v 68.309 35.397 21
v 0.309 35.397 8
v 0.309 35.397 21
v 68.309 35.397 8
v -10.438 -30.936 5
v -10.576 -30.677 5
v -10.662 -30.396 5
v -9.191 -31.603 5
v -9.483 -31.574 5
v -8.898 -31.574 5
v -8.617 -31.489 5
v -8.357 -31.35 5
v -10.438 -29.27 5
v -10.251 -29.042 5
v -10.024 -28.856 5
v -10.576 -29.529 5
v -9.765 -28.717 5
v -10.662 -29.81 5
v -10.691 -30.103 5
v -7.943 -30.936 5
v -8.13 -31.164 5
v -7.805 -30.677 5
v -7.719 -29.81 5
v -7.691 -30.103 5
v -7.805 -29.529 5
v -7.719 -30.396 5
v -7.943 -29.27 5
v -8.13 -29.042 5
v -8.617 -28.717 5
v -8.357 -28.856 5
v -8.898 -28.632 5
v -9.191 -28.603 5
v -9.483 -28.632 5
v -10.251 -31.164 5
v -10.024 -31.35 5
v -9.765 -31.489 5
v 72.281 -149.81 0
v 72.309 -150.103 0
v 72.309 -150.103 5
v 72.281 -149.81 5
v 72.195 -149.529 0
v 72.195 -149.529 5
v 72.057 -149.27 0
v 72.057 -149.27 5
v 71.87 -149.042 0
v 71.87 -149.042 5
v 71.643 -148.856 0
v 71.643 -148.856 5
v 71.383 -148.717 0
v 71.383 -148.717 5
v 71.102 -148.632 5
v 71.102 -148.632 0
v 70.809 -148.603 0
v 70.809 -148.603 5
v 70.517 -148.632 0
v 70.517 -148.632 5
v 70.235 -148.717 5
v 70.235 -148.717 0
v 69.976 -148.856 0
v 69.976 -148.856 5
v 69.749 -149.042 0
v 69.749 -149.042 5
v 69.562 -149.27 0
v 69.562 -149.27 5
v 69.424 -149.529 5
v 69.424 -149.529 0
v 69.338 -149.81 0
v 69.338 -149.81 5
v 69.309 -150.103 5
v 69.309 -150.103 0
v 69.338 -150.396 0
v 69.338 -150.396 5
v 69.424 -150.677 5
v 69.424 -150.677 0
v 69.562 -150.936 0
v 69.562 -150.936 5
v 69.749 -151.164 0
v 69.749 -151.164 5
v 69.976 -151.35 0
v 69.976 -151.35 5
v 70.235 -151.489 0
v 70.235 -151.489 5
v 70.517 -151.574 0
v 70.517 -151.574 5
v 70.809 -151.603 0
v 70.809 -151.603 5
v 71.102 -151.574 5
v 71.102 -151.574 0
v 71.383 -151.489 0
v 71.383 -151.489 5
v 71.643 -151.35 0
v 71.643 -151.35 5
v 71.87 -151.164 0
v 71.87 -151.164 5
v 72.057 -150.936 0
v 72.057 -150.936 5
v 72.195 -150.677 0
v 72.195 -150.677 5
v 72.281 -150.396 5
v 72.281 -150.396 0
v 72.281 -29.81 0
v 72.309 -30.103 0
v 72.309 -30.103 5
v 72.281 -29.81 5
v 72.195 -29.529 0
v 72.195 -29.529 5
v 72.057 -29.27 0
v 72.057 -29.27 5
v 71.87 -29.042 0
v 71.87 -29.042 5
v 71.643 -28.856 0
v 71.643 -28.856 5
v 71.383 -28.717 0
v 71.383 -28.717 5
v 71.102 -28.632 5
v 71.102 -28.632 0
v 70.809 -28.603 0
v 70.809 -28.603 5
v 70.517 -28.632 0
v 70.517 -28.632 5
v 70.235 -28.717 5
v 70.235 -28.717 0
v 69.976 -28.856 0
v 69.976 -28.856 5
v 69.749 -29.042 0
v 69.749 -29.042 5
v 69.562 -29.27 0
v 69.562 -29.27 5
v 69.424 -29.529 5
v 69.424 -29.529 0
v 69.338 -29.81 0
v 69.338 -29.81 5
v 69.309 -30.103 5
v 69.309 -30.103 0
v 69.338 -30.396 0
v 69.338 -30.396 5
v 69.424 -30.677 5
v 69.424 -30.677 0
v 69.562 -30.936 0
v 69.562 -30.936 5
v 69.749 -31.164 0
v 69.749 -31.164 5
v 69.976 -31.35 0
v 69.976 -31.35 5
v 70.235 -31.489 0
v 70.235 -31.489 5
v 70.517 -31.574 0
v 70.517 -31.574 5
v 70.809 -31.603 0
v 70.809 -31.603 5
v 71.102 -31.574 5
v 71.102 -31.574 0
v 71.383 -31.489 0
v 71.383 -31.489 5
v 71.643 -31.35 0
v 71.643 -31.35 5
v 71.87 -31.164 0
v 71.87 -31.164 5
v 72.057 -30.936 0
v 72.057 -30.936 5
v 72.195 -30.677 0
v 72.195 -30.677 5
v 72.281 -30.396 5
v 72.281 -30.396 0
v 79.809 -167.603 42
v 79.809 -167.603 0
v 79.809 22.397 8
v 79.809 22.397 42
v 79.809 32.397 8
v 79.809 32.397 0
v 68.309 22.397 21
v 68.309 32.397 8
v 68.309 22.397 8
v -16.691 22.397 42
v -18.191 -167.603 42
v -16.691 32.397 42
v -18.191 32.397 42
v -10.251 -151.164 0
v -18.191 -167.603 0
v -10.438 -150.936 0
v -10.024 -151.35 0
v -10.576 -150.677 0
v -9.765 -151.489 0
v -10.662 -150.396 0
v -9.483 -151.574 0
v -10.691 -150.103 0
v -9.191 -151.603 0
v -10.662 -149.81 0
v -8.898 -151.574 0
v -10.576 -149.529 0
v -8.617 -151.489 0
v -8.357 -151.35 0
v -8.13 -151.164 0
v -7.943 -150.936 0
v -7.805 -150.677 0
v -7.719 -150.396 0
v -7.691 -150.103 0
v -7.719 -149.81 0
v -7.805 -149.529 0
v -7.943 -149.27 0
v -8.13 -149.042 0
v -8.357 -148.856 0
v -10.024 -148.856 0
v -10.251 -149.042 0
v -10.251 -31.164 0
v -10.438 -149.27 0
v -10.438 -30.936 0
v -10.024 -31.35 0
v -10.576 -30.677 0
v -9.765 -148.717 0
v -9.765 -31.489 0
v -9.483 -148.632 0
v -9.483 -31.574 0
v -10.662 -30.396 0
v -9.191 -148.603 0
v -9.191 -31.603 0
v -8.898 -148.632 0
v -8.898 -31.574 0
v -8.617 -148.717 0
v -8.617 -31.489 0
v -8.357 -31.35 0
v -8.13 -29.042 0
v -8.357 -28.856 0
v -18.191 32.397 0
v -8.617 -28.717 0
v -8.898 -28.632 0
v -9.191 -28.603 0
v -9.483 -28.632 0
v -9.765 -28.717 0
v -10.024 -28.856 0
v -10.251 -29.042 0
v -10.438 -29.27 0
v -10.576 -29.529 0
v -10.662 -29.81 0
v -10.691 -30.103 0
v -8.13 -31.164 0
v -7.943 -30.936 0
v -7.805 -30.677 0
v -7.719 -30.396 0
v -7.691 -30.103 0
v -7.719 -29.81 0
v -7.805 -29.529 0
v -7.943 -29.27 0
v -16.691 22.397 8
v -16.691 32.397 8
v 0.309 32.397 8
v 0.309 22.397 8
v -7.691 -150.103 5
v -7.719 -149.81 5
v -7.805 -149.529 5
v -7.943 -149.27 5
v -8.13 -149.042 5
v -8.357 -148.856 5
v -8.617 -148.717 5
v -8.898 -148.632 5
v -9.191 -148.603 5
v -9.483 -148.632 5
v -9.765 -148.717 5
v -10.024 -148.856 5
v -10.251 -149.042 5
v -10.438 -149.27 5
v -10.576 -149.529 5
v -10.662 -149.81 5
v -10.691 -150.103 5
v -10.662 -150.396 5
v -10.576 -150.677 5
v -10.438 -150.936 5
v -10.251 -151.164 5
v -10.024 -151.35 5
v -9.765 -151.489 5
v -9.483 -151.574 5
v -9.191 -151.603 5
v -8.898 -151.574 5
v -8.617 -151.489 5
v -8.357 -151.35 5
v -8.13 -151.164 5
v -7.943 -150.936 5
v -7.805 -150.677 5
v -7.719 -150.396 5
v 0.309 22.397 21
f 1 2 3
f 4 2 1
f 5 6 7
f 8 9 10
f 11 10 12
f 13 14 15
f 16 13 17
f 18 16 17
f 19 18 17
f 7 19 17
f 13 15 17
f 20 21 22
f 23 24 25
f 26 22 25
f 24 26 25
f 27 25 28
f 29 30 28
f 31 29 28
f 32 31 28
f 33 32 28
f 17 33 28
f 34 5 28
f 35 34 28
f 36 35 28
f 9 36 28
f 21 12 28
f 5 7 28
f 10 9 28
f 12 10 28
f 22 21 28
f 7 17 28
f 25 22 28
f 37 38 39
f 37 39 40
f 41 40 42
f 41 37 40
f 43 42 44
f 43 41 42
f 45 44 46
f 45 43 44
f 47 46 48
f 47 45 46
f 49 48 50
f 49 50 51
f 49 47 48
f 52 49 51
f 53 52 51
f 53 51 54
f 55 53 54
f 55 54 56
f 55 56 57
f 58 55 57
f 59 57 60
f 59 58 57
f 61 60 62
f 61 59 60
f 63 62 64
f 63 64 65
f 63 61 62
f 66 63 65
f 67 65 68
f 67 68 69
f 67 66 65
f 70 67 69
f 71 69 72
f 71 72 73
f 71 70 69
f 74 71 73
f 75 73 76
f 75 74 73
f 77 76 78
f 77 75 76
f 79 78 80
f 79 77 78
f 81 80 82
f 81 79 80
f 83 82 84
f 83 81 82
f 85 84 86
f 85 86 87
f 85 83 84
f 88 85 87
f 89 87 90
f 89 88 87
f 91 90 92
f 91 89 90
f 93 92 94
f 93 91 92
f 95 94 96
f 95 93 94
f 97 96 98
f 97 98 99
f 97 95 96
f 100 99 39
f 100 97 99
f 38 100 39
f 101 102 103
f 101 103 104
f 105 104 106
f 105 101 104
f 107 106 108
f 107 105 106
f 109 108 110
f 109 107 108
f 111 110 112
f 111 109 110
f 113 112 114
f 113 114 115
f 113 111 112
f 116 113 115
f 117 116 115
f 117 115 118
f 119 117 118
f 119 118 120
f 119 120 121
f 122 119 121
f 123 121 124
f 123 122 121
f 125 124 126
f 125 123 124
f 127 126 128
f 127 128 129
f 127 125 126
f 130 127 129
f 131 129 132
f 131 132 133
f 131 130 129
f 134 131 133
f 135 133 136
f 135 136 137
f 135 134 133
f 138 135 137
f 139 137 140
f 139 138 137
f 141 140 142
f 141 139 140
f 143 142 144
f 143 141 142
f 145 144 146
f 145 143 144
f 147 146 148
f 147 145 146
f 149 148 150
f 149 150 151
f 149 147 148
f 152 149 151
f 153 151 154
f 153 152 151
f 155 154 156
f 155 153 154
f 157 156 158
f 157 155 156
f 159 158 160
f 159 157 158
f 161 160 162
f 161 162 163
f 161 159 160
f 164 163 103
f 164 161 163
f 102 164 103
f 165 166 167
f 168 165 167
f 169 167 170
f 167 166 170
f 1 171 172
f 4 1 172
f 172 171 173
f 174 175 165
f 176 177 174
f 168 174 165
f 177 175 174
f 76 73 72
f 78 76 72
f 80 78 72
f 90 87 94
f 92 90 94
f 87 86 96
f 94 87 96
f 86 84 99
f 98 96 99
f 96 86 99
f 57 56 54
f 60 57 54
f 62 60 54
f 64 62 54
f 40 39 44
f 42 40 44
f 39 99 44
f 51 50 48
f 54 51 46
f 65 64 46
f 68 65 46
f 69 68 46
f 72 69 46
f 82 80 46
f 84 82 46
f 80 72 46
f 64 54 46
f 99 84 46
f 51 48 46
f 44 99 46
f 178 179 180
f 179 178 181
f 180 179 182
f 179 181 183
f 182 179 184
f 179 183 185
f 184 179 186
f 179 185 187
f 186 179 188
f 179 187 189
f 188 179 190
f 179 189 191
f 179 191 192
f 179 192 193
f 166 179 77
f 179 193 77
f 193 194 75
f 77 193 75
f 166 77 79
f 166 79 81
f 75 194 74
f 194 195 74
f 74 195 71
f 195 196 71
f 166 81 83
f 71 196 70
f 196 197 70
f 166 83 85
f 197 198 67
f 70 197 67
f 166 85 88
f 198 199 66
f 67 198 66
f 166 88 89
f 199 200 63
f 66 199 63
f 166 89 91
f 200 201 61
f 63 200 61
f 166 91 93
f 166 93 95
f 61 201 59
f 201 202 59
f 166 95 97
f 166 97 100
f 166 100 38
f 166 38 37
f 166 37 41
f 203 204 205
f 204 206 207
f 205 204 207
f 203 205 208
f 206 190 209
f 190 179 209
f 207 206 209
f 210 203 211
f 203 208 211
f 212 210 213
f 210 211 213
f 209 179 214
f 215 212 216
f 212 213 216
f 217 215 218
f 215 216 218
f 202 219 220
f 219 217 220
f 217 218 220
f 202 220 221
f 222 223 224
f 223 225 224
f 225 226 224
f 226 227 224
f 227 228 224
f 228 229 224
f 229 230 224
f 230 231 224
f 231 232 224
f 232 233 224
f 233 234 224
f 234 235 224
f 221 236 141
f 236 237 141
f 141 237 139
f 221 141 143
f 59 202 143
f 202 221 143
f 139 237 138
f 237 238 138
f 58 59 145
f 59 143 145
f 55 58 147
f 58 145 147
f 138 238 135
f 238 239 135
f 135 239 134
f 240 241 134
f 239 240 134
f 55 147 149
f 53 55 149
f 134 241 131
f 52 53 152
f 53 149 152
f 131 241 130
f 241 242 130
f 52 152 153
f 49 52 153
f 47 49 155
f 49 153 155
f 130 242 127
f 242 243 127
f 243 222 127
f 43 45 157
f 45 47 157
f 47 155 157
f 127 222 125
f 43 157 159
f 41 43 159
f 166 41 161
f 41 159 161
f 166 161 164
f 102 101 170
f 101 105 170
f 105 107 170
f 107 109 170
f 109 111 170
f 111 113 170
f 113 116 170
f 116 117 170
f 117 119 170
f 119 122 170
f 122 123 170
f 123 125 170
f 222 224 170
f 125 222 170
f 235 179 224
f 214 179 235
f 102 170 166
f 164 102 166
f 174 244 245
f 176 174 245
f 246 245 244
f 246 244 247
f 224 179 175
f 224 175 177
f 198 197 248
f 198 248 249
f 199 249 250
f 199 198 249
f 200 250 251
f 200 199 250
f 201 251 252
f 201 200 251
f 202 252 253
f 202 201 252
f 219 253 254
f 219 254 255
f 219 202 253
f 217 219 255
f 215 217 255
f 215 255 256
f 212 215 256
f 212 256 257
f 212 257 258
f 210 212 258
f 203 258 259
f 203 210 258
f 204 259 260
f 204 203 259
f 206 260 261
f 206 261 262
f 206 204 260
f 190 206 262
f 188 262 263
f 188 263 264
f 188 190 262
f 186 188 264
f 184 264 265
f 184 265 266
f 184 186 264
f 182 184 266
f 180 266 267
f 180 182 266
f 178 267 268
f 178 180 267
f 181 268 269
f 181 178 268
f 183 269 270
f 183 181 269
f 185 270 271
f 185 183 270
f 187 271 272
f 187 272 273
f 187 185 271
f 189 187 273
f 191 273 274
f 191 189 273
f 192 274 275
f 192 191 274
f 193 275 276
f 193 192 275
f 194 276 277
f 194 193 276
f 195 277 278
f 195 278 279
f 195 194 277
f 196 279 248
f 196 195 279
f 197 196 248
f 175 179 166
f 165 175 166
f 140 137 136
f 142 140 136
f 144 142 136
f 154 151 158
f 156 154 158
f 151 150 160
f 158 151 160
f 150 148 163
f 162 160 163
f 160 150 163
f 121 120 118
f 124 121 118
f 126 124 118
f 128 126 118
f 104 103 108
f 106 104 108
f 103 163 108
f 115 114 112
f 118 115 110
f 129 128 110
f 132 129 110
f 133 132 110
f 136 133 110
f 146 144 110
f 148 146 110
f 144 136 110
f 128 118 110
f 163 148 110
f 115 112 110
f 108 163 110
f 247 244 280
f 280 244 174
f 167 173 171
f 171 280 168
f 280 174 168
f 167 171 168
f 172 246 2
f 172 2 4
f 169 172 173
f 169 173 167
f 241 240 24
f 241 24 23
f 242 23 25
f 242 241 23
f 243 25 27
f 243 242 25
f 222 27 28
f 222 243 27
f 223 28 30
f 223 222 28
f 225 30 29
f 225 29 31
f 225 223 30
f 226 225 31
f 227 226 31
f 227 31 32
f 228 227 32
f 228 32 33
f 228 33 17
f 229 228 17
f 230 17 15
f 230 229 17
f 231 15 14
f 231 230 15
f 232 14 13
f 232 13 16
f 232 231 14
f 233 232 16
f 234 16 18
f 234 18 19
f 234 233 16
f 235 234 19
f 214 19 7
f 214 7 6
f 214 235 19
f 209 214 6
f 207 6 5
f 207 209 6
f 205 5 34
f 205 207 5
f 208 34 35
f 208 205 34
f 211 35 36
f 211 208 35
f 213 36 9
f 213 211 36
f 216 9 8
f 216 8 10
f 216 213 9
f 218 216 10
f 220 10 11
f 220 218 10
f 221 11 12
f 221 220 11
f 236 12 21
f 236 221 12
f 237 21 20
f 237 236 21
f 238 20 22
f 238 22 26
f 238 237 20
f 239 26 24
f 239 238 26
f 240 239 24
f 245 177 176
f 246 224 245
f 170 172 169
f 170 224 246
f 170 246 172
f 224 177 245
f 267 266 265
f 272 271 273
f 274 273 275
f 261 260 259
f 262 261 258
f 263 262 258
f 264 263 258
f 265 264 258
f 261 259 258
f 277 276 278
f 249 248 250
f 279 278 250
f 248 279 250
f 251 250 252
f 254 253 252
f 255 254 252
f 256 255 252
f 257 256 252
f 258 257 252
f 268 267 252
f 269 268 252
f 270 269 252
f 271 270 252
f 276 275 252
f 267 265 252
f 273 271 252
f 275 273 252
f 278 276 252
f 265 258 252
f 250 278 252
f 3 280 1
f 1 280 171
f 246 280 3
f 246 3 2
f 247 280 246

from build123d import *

# Parameters (mm, degrees)
SKETCH_1_W          = 98
SKETCH_1_H          = 200
EXTRUDE_1_DEPTH     = 42
SKETCH_2_R          = 1.5
CUT_EXTRUDE_3_DEPTH = 5
SKETCH_3_W          = 96.5
SKETCH_3_H          = 10
CUT_EXTRUDE_4_DEPTH = 34
SKETCH_4_W          = 68
SKETCH_4_H          = 13
EXTRUDE_2_DEPTH     = 13


with BuildPart() as part:
    # Эскиз1 → Бобышка-Вытянуть1 (new body)
    with BuildSketch(Plane.XY):
        with Locations((30.809352232, -67.603045404)):
            Rectangle(SKETCH_1_W, SKETCH_1_H)
    extrude(amount=EXTRUDE_1_DEPTH)

    # Эскиз2 → Вырез-Вытянуть3 (cut)
    with BuildSketch(Plane.XY):
        with Locations((-9.190647768, -30.103045404)):
            Circle(SKETCH_2_R)
        with Locations((70.809352232, -30.103045404)):
            Circle(SKETCH_2_R)
        with Locations((-9.190647768, -150.103045404)):
            Circle(SKETCH_2_R)
        with Locations((70.809352232, -150.103045404)):
            Circle(SKETCH_2_R)
    extrude(amount=CUT_EXTRUDE_3_DEPTH, mode=Mode.SUBTRACT)

    # Эскиз3 → Вырез-Вытянуть4 (cut)
    with BuildSketch(Plane.XY.offset(42)):
        with Locations((31.559352232, 27.396954596)):
            Rectangle(SKETCH_3_W, SKETCH_3_H)
    extrude(amount=-CUT_EXTRUDE_4_DEPTH, mode=Mode.SUBTRACT)

    # Эскиз4 → Бобышка-Вытянуть2 (add)
    with BuildSketch(Plane(origin=(0, 22.396954596, 0), x_dir=(1, 0, 0), z_dir=(0, 1, 0))):
        with Locations((34.309352232, -14.5)):
            Rectangle(SKETCH_4_W, SKETCH_4_H)
    extrude(amount=EXTRUDE_2_DEPTH)


solid = part.part
